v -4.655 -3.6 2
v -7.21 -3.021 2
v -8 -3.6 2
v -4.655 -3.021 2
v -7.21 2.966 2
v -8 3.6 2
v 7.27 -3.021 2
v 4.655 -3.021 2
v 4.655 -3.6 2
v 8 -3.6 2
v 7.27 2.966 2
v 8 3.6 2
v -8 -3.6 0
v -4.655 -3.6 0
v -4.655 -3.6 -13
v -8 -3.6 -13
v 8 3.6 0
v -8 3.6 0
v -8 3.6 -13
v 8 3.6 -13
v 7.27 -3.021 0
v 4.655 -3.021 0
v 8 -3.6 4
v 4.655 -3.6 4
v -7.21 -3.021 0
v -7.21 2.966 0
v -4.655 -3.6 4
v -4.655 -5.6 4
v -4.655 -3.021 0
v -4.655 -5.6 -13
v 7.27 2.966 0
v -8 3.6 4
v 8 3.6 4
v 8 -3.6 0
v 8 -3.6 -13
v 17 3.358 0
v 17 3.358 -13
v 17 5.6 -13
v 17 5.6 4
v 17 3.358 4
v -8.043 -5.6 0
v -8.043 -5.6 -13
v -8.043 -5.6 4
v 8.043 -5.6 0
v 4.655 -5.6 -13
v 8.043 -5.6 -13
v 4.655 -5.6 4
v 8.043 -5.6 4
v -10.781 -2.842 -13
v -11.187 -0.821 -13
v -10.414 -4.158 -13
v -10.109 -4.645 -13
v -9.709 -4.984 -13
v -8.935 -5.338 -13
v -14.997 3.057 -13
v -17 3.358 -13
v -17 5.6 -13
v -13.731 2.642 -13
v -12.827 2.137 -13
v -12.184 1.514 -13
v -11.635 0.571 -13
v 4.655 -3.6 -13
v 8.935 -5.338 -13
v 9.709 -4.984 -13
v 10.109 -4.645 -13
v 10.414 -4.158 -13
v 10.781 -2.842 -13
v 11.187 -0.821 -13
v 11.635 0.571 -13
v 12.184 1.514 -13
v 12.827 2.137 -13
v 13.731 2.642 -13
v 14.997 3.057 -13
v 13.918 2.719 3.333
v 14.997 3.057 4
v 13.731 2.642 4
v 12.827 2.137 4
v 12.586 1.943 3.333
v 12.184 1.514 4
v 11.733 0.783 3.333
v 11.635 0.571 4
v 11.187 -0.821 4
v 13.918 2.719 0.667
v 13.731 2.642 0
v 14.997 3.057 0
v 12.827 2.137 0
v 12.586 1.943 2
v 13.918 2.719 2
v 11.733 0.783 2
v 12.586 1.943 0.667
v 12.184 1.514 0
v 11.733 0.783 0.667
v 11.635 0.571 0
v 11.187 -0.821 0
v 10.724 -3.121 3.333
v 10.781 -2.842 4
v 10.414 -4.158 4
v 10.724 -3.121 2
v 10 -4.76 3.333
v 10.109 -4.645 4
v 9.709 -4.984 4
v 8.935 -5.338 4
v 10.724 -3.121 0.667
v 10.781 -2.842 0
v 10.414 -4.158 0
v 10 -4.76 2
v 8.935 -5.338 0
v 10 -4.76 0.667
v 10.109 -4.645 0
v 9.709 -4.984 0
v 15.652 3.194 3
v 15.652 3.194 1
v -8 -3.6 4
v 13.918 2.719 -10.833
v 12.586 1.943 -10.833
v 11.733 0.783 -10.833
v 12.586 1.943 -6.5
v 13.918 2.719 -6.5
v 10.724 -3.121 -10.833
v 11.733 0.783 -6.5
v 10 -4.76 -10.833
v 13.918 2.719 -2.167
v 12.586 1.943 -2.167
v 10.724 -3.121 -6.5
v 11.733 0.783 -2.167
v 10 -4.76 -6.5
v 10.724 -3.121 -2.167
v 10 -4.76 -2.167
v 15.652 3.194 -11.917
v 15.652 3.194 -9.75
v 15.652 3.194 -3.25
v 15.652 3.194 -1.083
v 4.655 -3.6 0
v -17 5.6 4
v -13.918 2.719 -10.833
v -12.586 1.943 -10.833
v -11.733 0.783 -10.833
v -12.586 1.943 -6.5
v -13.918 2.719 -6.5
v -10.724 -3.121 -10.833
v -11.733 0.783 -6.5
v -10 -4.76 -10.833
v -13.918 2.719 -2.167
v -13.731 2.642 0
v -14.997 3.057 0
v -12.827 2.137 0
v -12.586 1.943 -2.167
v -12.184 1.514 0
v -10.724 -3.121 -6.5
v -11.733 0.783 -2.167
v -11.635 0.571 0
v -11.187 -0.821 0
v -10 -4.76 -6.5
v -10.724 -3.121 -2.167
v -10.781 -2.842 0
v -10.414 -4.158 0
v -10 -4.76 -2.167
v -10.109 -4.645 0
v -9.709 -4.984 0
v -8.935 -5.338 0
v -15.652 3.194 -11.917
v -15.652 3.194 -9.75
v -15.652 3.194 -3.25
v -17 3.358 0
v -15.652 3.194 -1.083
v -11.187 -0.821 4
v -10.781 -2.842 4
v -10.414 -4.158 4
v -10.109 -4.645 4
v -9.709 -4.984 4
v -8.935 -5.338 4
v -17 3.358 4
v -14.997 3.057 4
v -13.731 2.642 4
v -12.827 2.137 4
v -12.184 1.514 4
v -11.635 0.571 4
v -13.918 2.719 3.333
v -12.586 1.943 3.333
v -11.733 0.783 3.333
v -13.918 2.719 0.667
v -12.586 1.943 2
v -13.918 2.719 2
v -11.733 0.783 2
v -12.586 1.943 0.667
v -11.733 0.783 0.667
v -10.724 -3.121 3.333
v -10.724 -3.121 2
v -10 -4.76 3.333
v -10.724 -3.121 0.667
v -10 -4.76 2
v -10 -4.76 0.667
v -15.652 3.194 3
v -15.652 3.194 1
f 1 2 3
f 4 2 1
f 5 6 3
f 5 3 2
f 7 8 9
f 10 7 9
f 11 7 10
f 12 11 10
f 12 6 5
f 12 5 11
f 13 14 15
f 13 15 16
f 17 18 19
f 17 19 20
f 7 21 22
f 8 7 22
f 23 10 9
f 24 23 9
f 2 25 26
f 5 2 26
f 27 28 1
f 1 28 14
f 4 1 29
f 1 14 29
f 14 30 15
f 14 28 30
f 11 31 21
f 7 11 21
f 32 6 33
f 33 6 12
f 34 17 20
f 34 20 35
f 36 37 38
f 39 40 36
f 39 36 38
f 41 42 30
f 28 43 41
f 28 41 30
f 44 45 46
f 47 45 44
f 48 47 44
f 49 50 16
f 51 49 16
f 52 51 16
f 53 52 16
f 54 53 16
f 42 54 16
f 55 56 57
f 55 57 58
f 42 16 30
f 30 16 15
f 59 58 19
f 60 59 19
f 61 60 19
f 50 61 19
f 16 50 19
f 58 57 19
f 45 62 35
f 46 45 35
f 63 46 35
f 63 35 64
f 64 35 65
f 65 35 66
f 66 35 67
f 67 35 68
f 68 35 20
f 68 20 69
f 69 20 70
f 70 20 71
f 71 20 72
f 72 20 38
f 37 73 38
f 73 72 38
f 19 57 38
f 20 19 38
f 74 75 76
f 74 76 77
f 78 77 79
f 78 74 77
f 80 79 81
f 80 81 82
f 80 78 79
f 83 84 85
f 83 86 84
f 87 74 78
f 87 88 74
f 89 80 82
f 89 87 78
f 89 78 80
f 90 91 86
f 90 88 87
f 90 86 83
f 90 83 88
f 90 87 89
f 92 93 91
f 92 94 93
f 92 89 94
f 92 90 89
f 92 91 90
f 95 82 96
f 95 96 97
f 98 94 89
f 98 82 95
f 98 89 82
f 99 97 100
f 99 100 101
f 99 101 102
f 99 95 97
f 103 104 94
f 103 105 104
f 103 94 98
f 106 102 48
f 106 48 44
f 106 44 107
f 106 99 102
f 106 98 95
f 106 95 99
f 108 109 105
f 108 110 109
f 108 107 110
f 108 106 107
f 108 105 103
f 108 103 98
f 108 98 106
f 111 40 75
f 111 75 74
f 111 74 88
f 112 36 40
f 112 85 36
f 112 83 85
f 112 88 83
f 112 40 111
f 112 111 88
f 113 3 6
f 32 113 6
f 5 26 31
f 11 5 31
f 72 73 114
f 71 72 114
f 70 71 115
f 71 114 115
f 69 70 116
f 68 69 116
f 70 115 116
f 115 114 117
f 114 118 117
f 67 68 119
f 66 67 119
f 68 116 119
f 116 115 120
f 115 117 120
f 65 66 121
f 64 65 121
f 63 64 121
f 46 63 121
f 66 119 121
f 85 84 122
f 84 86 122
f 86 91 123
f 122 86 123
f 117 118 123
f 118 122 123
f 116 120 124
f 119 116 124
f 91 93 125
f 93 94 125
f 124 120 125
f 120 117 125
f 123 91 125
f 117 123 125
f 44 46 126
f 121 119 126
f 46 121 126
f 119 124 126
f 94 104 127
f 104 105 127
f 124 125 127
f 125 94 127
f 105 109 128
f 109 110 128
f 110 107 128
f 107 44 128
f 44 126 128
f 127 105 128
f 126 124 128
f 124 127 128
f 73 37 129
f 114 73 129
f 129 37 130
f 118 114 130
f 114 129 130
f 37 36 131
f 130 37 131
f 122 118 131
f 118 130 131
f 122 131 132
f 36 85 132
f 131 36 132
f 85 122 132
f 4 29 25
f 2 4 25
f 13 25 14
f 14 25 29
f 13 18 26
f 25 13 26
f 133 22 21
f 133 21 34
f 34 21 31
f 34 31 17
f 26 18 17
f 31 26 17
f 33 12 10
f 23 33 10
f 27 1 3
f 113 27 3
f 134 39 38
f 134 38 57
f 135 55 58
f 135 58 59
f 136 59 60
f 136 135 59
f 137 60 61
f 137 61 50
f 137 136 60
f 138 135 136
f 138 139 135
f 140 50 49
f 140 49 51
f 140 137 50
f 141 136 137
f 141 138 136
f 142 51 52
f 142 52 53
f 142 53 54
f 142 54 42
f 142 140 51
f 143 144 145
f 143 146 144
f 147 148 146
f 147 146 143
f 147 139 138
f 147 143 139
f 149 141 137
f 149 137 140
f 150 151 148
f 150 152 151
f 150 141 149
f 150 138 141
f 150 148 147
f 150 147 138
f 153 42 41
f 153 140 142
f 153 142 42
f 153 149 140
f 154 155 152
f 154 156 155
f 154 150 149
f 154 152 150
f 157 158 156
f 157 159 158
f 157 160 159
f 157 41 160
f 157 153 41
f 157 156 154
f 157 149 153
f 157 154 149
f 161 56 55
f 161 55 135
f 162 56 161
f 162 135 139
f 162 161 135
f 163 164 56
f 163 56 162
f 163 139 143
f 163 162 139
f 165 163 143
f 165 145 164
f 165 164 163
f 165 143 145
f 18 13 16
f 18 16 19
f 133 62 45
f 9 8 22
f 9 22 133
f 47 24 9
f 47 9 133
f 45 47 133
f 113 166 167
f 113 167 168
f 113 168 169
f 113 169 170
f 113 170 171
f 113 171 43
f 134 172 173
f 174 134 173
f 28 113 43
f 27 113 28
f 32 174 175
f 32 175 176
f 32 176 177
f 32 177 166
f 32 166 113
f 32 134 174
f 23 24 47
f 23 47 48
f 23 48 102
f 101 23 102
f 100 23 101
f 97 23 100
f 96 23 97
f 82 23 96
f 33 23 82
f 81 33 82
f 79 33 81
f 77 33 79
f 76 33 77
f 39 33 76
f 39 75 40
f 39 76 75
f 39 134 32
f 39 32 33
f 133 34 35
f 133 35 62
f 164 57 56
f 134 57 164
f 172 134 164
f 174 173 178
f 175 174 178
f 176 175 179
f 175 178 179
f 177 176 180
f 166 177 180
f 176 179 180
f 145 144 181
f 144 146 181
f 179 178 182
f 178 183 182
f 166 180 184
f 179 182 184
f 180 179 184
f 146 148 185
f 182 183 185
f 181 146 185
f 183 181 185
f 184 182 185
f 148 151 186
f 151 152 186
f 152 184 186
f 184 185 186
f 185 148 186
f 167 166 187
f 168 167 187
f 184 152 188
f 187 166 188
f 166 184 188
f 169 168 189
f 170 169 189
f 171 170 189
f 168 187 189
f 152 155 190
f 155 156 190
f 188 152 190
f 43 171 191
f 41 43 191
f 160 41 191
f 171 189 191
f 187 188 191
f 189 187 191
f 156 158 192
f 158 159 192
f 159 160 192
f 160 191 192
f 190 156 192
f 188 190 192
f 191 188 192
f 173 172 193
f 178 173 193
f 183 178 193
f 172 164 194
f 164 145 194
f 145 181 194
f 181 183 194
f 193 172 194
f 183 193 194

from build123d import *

# Parameters (mm, degrees)
F1_DEPTH      = 2
F2_DEPTH      = 4
F2_DEPTH_BACK = 13


with BuildPart() as f1:
    # F0 (on Top) → F1 (new body)
    with BuildSketch(Plane.XY):
        Polygon((7.2700278834, -3.6), (8, -3.6), (8, 3.6), (-8, 3.6), (-8, -3.6), (-7.2095277719, -3.6), (-4.6549369581, -3.6), (-4.6549369581, -3.020639997), (-7.2095277719, -3.020639997), (-7.2095277719, 2.9658868443), (7.2700278834, 2.9658868443), (7.2700278834, -3.020639997), (4.6549369581, -3.020639997), (4.6549369581, -3.6), align=None)
    extrude(amount=F1_DEPTH)

    # F0 (on Top) → F2 (join, two sides)
    with BuildSketch(Plane.XY) as f2_sk:
        with BuildLine():
            Line((8, 3.6), (8, -3.6))
            Line((8, -3.6), (7.2700278834, -3.6))
            Line((7.2700278834, -3.6), (4.6549369581, -3.6))
            Line((4.6549369581, -3.6), (4.6549369581, -5.6))
            Line((4.6549369581, -5.6), (8.0430833623, -5.6))
            add(Edge.make_bspline(
                [(17, 3.3577582799), (16.4960496733, 3.3138412818), (15.3171334064, 3.2111040461), (12.2268822698, 2.2686653788), (11.1432918225, -0.5621284554), (10.7879122798, -3.0615930247), (10.2337171383, -5.0066227654), (8.7940404903, -5.3965881524), (8.0430833623, -5.6)],
                knots=[0, 0, 0, 0, 0.1417777064, 0.3316676972, 0.5171721131, 0.6933841431, 0.8400645286, 1, 1, 1, 1], degree=3))
            Line((17, 3.3577582799), (17, 5.6))
            Line((17, 5.6), (10, 5.6))
            Line((10, 5.6), (-10, 5.6))
            Line((-10, 5.6), (-17, 5.6))
            Line((-17, 5.6), (-17, 3.3577582799))
            add(Edge.make_bspline(
                [(-17, 3.3577582799), (-16.4960496733, 3.3138412818), (-15.3171334064, 3.2111040461), (-12.2268822698, 2.2686653788), (-11.1432918225, -0.5621284554), (-10.7879122798, -3.0615930247), (-10.2337171383, -5.0066227654), (-8.7940404903, -5.3965881524), (-8.0430833623, -5.6)],
                knots=[0, 0, 0, 0, 0.1417777064, 0.3316676972, 0.5171721131, 0.6933841431, 0.8400645286, 1, 1, 1, 1], degree=3))
            Line((-8.0430833623, -5.6), (-4.6549369581, -5.6))
            Line((-4.6549369581, -5.6), (-4.6549369581, -3.6))
            Line((-4.6549369581, -3.6), (-7.2095277719, -3.6))
            Line((-7.2095277719, -3.6), (-8, -3.6))
            Line((-8, -3.6), (-8, 3.6))
            Line((-8, 3.6), (8, 3.6))
        make_face()
    extrude(amount=F2_DEPTH)
    extrude(f2_sk.sketch, amount=-F2_DEPTH_BACK)


solid = f1.part
